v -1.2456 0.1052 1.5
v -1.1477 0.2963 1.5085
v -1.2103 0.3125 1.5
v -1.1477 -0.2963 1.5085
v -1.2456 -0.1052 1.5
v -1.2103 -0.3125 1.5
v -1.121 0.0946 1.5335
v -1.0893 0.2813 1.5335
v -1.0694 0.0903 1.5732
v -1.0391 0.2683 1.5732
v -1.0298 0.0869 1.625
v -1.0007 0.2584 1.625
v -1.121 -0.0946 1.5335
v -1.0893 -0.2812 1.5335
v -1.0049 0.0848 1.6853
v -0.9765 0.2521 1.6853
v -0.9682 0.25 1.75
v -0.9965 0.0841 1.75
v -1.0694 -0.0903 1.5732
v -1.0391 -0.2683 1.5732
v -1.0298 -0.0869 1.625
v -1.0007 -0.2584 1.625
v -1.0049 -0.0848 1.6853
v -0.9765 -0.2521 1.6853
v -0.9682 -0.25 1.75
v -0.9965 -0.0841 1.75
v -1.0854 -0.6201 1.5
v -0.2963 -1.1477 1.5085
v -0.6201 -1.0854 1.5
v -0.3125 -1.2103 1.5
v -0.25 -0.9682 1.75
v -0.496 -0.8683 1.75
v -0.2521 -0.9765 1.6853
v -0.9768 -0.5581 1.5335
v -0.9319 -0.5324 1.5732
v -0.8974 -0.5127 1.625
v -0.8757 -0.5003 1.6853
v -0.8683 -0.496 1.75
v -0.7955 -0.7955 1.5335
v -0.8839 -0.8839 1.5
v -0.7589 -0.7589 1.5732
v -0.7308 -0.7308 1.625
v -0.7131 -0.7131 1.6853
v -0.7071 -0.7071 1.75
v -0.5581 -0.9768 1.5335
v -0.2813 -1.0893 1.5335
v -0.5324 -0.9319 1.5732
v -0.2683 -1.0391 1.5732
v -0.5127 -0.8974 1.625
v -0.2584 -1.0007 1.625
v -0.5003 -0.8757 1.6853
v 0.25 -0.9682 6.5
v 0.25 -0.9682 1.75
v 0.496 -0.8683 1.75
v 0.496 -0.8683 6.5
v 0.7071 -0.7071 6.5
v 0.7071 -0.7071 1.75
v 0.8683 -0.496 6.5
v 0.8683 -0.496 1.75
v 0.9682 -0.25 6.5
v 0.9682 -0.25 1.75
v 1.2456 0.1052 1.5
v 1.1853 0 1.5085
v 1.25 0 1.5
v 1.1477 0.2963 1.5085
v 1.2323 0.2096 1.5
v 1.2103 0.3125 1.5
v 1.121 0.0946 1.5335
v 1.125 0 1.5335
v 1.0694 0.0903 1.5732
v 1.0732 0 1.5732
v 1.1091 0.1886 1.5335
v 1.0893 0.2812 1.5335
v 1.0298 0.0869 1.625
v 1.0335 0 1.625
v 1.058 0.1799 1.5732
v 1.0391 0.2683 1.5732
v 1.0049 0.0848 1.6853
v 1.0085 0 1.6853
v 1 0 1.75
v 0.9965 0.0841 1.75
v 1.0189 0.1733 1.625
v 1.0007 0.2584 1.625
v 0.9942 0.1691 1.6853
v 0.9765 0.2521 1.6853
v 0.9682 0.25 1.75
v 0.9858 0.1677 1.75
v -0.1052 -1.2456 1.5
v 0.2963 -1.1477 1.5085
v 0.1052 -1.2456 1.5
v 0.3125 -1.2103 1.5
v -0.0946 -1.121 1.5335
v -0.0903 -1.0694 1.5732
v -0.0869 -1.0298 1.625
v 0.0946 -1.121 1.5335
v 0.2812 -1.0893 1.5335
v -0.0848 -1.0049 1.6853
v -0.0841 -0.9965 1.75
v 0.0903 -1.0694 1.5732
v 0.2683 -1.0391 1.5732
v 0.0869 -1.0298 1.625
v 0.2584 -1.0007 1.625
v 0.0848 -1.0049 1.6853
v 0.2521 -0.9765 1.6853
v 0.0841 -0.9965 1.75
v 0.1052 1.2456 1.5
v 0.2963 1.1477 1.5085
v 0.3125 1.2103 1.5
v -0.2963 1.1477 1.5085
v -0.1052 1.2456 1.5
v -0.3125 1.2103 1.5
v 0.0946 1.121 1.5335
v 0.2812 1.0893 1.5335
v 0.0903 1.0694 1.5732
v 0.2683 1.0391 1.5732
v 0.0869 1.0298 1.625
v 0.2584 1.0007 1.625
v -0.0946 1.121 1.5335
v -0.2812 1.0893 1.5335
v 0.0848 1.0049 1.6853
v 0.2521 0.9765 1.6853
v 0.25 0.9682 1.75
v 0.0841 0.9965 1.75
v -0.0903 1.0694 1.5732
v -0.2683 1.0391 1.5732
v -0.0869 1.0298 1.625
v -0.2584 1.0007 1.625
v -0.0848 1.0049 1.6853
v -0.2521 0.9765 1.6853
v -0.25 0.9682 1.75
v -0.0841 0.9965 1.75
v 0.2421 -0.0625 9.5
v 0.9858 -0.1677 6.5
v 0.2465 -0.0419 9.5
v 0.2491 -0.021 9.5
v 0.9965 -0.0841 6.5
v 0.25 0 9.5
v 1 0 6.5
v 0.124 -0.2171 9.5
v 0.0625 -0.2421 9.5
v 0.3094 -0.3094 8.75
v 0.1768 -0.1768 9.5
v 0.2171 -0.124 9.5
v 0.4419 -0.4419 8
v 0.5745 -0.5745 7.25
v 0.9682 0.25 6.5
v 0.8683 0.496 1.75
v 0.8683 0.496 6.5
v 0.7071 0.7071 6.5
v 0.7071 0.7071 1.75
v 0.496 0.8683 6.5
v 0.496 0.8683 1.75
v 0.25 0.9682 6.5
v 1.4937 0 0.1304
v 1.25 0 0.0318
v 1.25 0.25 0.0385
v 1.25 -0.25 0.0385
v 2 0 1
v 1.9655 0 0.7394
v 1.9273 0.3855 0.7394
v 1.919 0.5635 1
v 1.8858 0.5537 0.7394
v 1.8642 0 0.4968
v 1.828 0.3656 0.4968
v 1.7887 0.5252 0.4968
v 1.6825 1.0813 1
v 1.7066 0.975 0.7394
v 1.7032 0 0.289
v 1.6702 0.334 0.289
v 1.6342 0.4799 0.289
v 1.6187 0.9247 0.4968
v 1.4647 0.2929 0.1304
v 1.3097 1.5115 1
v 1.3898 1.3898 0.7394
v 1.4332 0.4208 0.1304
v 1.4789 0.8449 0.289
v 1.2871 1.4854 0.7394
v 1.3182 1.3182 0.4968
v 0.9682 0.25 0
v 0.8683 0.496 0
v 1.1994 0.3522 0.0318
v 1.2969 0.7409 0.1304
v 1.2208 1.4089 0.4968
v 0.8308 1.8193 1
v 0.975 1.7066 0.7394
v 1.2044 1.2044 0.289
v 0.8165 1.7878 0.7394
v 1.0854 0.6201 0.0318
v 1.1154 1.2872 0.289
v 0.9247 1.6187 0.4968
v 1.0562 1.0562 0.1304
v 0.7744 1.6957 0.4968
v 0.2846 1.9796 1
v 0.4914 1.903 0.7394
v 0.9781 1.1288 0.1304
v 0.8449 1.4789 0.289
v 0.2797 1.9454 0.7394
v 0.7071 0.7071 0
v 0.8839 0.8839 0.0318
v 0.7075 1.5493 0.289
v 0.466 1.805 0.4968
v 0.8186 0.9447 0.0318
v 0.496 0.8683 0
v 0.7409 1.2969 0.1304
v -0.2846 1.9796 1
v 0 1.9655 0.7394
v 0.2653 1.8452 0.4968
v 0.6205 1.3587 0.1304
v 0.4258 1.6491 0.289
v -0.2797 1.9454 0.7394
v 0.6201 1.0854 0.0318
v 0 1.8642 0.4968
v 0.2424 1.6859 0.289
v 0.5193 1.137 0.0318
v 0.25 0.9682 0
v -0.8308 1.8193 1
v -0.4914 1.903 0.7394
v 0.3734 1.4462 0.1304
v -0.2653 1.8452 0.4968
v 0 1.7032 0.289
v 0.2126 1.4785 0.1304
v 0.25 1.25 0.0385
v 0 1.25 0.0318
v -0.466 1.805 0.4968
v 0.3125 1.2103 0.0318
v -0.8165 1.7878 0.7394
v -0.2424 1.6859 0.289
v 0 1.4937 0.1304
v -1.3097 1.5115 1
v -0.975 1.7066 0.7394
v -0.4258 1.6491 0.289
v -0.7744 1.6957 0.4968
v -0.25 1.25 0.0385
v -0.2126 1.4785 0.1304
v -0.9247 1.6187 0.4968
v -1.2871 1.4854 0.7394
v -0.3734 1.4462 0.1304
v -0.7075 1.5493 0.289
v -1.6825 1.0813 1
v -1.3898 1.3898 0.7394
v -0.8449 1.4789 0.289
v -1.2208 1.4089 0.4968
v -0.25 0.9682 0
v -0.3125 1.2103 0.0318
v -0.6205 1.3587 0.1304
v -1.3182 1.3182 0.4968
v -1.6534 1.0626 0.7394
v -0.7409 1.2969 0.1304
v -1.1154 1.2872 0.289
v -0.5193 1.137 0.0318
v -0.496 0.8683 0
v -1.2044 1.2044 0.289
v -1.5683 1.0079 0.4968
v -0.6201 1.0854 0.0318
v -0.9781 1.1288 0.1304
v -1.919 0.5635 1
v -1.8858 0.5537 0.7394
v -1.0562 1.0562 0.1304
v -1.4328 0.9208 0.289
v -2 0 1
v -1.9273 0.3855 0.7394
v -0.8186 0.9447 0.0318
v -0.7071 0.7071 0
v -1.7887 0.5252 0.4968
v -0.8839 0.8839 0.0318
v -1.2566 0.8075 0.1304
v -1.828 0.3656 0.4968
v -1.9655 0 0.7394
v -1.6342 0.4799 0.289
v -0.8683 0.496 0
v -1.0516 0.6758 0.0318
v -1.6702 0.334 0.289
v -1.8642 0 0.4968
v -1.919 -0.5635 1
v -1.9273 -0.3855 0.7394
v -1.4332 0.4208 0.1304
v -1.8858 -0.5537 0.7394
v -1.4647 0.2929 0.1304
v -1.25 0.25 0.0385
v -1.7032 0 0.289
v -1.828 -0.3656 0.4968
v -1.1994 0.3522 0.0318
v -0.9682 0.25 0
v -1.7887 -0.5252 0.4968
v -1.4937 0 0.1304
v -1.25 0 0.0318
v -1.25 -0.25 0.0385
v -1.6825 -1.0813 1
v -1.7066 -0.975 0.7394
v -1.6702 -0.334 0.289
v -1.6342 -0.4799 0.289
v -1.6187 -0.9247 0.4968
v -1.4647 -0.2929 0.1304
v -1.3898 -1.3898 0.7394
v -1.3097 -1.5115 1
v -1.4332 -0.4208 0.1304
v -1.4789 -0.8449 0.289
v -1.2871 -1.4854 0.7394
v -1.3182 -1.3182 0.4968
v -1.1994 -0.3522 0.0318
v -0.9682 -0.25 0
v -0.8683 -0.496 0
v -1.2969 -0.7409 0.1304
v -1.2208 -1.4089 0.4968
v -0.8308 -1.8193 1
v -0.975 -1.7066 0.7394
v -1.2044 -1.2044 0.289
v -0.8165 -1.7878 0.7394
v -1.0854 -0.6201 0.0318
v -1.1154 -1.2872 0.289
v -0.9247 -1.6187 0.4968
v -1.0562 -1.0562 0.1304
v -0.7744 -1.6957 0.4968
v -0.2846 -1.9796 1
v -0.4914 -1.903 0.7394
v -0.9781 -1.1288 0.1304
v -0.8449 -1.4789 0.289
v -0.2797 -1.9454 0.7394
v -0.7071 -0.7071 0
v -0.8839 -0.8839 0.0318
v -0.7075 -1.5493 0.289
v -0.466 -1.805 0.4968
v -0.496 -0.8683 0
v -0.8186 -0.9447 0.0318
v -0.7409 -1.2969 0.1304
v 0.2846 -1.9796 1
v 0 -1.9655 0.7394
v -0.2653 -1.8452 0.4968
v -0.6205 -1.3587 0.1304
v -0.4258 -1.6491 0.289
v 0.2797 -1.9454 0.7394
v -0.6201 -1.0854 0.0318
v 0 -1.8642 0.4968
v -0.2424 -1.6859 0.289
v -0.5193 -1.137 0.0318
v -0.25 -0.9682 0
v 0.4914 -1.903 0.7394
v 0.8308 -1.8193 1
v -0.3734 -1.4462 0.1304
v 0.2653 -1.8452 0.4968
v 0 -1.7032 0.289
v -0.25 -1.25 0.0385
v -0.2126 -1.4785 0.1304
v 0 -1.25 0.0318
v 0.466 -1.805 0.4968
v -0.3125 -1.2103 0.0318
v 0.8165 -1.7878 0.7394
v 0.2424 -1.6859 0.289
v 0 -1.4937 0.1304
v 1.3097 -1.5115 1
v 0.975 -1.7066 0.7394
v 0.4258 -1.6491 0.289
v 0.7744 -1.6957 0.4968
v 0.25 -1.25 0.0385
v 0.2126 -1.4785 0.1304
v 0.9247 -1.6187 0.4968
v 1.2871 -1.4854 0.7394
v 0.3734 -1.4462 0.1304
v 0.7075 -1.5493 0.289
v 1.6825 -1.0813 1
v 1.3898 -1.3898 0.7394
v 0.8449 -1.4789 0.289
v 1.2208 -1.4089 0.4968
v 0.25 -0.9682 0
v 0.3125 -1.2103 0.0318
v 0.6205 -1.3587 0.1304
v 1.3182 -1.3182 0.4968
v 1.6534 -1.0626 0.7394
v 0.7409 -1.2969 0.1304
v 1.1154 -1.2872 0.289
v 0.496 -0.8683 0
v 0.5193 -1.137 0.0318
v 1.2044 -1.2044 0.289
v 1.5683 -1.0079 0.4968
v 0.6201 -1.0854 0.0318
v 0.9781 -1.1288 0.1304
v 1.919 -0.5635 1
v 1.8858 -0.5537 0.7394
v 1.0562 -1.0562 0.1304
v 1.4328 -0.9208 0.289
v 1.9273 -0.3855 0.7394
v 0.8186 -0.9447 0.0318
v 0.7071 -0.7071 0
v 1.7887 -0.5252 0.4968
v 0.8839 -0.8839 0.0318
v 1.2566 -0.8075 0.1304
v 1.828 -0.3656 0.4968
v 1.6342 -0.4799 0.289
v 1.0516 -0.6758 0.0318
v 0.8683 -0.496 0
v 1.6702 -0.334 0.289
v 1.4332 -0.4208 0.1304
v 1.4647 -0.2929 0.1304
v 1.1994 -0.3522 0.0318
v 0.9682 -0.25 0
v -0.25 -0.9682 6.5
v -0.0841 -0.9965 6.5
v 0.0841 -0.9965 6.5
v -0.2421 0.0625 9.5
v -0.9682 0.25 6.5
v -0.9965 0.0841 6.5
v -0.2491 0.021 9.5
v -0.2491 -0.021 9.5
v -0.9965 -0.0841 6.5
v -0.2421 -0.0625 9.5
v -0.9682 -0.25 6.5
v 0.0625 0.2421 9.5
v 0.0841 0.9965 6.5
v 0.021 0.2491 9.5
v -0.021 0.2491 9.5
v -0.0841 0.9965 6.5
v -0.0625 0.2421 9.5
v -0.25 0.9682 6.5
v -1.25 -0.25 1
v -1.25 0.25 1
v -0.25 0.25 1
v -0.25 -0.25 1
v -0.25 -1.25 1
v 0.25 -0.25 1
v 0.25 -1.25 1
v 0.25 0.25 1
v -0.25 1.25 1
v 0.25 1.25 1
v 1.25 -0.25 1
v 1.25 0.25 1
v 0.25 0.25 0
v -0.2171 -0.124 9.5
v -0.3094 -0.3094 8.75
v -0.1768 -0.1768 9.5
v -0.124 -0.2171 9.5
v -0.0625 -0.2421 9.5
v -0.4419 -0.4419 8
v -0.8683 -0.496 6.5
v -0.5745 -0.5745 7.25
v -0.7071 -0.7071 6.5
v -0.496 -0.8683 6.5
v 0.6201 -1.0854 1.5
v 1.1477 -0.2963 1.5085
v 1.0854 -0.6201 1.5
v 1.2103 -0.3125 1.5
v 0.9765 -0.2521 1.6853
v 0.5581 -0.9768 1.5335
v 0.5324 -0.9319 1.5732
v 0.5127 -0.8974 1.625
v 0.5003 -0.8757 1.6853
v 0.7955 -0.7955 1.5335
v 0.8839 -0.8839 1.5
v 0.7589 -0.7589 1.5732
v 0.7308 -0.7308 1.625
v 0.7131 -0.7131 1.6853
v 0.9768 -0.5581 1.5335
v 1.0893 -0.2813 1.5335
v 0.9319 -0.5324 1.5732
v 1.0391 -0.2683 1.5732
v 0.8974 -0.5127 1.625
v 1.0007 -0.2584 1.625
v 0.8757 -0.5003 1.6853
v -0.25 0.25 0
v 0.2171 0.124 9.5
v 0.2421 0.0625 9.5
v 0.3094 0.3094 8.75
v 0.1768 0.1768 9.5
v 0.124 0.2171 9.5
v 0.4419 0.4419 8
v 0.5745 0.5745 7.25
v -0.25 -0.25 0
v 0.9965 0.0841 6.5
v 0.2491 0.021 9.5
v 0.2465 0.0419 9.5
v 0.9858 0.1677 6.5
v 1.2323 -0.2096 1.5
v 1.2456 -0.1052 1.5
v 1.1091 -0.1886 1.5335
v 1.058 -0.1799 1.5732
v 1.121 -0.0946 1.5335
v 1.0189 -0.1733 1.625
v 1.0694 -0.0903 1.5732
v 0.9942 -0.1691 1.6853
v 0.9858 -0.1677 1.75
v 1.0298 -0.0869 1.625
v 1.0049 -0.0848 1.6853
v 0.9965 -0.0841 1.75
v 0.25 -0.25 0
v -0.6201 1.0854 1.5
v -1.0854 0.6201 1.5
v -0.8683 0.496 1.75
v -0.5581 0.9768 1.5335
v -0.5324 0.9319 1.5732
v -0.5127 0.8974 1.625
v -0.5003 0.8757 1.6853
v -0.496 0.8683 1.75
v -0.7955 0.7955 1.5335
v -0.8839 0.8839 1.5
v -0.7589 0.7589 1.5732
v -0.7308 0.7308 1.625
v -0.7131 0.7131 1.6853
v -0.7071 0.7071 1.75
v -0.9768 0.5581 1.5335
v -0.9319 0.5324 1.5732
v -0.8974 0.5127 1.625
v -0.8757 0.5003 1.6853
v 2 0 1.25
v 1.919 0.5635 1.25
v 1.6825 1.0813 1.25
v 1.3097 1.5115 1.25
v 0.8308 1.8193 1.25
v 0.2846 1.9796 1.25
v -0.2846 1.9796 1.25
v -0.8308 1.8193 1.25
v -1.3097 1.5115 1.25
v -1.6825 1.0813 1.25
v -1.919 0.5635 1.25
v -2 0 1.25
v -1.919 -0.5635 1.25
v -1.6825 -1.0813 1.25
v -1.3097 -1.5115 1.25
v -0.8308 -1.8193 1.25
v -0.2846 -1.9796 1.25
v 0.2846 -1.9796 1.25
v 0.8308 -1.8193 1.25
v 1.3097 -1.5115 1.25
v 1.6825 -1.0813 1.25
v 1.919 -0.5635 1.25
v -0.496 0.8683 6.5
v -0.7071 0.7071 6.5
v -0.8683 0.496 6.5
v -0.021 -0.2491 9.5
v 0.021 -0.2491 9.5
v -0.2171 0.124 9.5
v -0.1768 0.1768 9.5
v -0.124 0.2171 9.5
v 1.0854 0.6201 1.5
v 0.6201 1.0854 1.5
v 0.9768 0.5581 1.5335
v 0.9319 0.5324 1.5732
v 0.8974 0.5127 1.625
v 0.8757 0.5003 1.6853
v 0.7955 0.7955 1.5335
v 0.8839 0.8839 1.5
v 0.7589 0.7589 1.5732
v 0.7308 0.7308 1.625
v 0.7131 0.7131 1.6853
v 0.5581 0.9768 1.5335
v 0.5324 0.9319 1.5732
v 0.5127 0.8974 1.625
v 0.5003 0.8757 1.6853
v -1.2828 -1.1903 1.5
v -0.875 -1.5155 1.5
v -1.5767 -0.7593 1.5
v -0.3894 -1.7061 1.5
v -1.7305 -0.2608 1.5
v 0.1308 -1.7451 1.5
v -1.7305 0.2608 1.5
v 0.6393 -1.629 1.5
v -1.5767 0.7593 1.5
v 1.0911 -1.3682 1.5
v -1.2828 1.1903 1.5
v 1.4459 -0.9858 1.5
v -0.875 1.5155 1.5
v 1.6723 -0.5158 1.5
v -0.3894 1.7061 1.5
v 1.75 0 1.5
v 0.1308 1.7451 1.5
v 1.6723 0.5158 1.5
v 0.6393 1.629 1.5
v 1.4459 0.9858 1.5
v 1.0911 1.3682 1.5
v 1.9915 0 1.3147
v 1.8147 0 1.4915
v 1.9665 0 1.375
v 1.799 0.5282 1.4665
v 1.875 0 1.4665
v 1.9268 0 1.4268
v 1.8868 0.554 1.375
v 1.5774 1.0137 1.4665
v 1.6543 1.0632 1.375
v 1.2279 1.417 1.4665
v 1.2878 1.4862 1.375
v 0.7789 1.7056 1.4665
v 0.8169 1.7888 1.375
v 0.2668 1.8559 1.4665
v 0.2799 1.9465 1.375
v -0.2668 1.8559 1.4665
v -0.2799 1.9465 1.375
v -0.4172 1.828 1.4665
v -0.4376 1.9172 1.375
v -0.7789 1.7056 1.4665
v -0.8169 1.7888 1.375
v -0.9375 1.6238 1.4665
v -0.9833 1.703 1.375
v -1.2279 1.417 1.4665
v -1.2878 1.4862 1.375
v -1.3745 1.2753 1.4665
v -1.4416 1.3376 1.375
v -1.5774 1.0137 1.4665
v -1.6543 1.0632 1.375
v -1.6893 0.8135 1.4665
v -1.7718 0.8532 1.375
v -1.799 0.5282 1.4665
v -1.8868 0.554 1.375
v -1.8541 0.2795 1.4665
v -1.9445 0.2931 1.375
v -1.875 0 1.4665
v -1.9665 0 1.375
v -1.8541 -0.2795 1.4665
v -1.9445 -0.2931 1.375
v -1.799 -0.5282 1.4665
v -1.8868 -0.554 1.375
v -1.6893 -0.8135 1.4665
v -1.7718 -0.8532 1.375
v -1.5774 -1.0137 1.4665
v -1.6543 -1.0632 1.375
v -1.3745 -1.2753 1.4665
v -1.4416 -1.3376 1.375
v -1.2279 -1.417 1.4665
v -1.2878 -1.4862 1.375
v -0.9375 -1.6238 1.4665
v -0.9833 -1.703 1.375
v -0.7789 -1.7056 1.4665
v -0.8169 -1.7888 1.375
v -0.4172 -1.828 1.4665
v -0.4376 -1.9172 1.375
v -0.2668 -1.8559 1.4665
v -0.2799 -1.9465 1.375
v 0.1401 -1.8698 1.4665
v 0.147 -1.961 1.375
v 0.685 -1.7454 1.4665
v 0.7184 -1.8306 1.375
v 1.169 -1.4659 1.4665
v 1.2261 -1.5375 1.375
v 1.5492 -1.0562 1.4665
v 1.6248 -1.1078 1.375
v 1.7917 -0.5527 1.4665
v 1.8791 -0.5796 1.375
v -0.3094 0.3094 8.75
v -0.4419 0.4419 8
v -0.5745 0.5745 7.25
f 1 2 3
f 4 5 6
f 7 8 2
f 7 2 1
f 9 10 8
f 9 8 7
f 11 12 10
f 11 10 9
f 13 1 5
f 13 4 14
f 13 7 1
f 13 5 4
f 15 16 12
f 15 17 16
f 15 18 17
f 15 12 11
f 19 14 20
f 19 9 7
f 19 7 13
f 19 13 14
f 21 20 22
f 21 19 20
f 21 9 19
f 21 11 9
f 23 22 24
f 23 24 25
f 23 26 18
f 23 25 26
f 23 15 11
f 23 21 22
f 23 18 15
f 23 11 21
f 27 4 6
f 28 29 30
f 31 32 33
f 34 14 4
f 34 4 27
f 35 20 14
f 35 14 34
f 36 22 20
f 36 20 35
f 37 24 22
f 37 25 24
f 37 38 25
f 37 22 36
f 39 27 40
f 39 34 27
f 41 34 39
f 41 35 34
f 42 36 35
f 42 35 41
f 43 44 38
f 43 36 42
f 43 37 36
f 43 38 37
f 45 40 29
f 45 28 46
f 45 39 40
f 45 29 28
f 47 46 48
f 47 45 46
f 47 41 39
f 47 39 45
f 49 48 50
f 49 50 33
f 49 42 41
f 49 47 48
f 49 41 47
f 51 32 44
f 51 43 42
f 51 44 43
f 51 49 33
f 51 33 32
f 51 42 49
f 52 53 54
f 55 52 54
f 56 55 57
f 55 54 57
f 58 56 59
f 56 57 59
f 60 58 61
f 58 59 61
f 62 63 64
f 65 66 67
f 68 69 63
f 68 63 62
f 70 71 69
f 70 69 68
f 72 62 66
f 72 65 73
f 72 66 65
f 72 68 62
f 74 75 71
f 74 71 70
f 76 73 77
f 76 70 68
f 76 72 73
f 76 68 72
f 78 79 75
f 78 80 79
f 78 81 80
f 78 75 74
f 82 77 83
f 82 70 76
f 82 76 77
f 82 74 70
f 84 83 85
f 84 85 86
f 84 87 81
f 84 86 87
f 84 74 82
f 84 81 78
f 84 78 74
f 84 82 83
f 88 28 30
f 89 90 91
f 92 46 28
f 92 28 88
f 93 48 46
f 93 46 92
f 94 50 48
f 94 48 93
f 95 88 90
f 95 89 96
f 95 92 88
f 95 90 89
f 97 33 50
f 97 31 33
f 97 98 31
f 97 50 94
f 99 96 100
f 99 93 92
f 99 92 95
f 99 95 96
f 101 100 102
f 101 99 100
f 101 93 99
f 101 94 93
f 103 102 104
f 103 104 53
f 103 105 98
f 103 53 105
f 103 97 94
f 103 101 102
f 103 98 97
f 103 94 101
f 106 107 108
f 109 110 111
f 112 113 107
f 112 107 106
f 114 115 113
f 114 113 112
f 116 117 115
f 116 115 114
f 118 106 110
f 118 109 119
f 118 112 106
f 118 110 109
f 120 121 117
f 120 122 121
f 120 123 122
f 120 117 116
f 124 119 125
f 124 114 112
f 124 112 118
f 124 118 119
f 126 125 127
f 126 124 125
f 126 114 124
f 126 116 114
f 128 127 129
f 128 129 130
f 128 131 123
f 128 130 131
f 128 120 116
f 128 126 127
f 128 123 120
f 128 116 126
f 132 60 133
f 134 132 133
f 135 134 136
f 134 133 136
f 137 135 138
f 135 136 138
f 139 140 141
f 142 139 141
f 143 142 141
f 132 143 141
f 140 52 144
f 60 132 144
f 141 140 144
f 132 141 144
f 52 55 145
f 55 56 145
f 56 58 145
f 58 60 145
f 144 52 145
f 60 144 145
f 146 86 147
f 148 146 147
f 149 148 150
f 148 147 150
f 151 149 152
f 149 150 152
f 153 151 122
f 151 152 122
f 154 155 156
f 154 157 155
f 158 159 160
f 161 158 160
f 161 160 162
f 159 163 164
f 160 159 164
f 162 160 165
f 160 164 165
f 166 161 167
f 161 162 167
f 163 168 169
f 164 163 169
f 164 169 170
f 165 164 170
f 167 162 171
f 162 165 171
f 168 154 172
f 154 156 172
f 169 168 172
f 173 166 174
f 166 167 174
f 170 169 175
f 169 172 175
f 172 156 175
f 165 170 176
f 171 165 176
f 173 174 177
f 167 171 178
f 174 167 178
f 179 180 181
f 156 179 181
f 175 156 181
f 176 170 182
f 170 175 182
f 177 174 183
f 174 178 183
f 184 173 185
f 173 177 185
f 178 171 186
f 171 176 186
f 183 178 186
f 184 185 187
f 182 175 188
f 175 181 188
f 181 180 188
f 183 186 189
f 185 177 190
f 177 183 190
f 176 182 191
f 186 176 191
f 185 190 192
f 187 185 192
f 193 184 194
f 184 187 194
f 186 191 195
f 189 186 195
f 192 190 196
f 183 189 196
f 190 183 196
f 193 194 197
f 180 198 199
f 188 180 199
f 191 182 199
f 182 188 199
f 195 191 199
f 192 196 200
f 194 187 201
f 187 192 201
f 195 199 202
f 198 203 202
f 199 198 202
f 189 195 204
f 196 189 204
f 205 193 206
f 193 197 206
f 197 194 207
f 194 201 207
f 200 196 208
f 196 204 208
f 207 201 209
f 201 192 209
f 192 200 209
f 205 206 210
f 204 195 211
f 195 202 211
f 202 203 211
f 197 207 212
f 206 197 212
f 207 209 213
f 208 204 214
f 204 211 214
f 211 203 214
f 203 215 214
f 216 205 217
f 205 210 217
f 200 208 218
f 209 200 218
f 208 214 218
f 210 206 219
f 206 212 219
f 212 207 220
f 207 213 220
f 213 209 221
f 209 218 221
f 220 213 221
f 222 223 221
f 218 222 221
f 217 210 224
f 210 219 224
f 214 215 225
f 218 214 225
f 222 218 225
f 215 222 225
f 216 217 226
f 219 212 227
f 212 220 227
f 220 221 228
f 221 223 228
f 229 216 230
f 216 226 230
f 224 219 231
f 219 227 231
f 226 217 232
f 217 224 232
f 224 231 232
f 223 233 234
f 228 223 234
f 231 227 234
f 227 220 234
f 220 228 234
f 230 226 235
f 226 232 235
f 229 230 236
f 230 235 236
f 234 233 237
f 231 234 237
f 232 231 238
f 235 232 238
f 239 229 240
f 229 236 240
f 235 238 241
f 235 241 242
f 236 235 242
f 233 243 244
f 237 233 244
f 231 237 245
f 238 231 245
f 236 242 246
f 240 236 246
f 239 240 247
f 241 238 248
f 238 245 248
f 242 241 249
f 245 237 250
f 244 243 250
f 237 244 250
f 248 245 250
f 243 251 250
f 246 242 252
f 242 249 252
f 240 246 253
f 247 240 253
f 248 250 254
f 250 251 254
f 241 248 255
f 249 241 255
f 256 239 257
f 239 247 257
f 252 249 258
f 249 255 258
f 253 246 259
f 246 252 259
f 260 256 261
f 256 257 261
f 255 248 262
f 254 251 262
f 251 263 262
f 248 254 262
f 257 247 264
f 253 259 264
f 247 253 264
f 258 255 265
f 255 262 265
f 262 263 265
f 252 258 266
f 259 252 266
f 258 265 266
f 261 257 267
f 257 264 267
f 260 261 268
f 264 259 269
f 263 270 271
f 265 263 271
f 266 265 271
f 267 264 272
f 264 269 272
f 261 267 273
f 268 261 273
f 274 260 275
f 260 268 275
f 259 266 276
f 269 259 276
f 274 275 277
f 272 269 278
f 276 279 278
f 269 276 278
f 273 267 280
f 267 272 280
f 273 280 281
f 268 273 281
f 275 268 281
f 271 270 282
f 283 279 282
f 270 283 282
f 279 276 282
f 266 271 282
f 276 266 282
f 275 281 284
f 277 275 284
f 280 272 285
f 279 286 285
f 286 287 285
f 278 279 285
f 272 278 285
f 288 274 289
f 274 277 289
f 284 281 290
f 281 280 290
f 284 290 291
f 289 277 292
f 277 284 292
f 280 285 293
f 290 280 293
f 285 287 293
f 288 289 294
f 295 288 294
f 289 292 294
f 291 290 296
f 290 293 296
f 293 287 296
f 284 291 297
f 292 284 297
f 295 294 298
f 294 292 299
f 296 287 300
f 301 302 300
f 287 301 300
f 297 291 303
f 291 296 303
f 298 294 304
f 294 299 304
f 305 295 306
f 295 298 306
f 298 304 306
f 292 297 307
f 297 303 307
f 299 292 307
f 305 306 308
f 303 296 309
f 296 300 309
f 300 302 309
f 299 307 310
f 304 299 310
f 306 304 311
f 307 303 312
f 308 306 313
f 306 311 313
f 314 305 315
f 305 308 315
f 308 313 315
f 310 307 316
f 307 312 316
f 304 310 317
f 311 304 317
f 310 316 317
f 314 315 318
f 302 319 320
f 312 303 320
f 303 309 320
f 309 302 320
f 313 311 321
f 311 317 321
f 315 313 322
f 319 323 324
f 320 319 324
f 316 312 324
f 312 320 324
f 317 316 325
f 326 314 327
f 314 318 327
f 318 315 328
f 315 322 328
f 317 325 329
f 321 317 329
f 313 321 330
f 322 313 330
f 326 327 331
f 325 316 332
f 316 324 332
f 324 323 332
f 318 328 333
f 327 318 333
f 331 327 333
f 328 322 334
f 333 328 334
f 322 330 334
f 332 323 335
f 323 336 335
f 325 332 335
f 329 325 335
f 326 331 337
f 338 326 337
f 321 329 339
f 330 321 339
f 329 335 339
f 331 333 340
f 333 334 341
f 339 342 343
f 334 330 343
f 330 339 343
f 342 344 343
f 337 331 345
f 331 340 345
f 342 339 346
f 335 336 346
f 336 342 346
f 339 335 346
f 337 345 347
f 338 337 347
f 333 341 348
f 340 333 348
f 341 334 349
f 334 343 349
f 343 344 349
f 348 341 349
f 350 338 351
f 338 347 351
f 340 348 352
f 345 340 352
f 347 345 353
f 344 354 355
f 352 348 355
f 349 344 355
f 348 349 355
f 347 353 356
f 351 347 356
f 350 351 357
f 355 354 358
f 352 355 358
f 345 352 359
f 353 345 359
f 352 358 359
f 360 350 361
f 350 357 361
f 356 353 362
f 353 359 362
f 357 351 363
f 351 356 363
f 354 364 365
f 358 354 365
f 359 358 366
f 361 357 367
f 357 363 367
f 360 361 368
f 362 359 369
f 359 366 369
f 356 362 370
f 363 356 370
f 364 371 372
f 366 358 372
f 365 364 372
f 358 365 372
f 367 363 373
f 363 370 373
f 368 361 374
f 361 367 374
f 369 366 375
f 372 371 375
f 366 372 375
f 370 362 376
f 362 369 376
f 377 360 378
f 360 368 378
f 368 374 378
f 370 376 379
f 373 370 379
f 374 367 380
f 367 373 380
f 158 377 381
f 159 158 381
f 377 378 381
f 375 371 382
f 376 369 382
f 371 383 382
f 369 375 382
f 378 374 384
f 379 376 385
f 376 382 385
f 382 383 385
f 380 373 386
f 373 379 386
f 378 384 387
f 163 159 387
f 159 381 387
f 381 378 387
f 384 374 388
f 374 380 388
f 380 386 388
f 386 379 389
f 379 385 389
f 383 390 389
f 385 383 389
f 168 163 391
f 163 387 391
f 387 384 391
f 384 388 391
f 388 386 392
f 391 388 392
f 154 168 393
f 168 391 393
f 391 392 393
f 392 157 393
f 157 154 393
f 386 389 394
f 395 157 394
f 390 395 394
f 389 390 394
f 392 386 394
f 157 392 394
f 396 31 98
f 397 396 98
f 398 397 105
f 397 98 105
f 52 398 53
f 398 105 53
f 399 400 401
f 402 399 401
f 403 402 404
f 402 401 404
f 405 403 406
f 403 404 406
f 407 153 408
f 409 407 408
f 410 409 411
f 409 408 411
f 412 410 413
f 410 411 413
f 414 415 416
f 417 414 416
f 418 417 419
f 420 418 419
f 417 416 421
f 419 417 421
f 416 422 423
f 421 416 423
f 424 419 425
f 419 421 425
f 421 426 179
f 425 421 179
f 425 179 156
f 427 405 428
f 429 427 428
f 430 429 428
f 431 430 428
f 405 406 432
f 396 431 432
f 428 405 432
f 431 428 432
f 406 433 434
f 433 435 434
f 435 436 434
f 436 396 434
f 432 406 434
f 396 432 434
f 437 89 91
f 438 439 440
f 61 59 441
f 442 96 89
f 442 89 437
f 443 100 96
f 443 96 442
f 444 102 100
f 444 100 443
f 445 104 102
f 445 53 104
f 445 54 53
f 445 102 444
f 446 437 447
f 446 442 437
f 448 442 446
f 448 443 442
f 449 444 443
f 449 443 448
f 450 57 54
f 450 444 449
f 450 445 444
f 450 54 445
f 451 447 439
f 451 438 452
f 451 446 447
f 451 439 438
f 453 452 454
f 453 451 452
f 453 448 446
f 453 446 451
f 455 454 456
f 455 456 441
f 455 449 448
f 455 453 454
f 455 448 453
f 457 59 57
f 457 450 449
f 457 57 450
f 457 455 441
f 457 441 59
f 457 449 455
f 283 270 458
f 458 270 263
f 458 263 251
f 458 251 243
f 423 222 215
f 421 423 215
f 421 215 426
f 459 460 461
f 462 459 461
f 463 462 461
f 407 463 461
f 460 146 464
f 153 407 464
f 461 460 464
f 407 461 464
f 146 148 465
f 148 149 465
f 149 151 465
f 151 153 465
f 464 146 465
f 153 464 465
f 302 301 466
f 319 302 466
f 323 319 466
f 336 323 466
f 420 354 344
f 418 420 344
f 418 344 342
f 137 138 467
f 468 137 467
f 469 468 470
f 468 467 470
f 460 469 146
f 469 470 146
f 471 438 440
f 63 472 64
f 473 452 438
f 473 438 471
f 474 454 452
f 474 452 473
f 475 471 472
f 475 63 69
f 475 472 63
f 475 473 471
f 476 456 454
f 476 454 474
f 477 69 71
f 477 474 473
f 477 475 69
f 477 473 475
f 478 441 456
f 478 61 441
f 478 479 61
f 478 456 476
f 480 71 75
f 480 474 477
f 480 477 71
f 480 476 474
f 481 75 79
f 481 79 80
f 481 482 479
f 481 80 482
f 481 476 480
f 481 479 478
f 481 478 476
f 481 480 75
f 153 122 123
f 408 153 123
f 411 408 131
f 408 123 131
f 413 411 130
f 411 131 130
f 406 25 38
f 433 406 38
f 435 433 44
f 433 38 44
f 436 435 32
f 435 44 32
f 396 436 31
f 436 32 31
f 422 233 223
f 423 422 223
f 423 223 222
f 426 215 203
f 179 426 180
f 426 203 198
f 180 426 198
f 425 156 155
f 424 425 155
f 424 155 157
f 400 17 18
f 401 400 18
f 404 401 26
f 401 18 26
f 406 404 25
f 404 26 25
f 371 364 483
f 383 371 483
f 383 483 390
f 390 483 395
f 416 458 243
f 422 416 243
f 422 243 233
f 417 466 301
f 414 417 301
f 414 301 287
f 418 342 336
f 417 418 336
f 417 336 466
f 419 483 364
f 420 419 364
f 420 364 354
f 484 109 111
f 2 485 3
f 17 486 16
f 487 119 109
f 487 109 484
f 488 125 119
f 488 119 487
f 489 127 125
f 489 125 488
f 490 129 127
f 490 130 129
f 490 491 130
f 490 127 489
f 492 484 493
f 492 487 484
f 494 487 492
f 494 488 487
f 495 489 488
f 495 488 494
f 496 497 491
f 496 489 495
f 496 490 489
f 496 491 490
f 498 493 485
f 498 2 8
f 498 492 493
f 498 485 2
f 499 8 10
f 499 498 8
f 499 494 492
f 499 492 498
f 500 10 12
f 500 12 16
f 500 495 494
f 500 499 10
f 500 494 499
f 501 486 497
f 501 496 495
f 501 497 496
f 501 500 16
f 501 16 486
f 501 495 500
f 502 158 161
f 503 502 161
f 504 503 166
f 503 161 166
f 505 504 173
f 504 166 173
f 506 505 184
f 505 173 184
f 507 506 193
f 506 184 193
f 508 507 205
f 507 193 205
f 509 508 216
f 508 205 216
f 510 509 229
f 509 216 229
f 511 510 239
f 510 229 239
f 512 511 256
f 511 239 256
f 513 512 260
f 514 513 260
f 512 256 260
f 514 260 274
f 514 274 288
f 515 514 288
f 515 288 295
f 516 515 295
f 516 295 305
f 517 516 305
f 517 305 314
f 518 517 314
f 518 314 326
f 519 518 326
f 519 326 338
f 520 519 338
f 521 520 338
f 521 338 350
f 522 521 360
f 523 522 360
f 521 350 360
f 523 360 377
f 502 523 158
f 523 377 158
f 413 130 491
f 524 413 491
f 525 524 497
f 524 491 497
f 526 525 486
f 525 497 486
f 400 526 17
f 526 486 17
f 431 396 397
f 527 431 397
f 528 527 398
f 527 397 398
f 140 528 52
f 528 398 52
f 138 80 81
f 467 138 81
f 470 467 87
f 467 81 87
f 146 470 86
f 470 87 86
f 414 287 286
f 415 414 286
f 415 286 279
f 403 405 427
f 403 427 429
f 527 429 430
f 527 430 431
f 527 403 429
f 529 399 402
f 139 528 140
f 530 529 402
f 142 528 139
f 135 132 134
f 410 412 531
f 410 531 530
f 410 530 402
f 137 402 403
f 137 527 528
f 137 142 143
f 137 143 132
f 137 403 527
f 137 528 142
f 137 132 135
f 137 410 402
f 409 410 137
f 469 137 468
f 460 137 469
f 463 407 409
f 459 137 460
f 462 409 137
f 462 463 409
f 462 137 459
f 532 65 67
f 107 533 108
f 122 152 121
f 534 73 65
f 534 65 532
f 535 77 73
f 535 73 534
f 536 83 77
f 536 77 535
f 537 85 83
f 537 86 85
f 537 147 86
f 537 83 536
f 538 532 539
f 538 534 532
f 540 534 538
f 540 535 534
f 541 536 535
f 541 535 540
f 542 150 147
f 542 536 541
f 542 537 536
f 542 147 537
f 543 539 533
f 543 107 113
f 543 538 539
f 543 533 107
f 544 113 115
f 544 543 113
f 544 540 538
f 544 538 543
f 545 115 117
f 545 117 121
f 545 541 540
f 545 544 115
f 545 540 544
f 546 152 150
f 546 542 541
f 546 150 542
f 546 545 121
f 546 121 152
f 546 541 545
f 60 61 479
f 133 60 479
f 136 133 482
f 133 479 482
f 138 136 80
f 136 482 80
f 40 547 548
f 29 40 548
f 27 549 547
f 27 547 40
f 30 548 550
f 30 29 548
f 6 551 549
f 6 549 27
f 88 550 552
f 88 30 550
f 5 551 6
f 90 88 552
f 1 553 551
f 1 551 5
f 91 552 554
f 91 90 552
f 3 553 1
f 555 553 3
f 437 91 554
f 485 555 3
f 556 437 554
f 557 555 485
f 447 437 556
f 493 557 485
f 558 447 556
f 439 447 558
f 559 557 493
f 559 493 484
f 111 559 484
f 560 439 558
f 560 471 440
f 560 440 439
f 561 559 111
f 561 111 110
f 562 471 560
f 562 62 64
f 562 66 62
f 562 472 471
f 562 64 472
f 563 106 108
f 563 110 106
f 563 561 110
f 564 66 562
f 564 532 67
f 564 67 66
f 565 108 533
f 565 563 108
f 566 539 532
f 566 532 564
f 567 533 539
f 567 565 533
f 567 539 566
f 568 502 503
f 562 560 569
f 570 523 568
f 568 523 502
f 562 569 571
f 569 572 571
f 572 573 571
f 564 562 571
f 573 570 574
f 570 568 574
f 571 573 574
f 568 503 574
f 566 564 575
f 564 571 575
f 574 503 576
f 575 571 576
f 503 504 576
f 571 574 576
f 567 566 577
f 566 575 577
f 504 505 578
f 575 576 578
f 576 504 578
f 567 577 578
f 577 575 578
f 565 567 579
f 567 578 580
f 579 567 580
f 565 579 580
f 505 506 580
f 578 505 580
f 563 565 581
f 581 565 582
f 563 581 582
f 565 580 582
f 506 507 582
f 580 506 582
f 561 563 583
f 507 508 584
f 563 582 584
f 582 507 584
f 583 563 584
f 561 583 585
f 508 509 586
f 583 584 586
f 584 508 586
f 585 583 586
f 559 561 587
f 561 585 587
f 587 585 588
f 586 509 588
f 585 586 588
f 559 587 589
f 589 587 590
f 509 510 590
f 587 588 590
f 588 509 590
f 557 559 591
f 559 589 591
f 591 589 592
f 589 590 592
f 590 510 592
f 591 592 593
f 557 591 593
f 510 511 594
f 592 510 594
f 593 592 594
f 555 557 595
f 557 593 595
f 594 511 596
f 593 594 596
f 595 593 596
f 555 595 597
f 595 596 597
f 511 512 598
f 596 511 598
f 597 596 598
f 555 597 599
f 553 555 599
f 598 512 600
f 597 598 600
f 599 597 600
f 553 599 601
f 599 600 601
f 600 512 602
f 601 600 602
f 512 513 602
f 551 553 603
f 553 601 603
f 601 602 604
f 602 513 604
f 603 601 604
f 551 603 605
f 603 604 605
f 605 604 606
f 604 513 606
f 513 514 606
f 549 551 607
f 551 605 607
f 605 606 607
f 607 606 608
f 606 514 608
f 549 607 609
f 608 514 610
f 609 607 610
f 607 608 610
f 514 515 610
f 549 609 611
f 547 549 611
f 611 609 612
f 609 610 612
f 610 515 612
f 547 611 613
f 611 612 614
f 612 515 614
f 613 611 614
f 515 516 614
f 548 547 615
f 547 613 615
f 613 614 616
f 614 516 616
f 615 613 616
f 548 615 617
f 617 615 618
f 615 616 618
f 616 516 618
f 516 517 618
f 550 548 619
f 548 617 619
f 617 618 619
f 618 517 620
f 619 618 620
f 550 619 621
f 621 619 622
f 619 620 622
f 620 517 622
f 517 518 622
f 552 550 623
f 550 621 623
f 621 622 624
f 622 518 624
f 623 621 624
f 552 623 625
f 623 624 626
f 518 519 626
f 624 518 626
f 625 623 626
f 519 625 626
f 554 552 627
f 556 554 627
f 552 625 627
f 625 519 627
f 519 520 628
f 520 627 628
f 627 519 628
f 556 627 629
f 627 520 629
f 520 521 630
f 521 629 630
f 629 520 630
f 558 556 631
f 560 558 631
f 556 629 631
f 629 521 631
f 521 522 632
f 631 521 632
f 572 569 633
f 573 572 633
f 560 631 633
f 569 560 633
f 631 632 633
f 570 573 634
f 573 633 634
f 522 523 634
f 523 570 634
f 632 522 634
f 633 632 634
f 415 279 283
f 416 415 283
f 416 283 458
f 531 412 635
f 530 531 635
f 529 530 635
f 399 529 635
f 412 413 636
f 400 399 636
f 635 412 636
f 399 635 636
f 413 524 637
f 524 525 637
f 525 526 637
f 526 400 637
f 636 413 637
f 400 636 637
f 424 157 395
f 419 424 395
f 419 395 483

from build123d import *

# Parameters (mm, degrees)
F0_R     = 2
F1_DEPTH = 1
F2_START = 1
F0_W     = 0.5
F0_H     = 0.5
F2_DEPTH = 0.5
F3_START = 1.5
F3_DEPTH = 8
F4_SIZE2 = 3
F4_SIZE  = 0.75
F6_R     = 0.25


# Not quite as in the source:
# - a fillet or chamfer that OpenCascade refuses, or shapes differently, is made with other operations: its cross-section is extruded or revolved along the edge and cut away or added


with BuildPart() as f1:
    # F0 (on Top) → F1 (new body)
    with BuildSketch(Plane.XY):
        Circle(F0_R)
        with BuildLine():
            ThreePointArc((0.25, 0.9682458366), (0.7071067812, 0.7071067812), (0.9682458366, 0.25))
            Line((0.9682458366, 0.25), (1.25, 0.25))
            Line((1.25, 0.25), (1.25, -0.25))
            Line((1.25, -0.25), (0.9682458366, -0.25))
            ThreePointArc((0.9682458366, -0.25), (0.7071067812, -0.7071067812), (0.25, -0.9682458366))
            Line((0.25, -0.9682458366), (0.25, -1.25))
            Line((0.25, -1.25), (-0.25, -1.25))
            Line((-0.25, -1.25), (-0.25, -0.9682458366))
            ThreePointArc((-0.25, -0.9682458366), (-0.7071067812, -0.7071067812), (-0.9682458366, -0.25))
            Line((-0.9682458366, -0.25), (-1.25, -0.25))
            Line((-1.25, -0.25), (-1.25, 0.25))
            Line((-1.25, 0.25), (-0.9682458366, 0.25))
            ThreePointArc((-0.9682458366, 0.25), (-0.7071067812, 0.7071067812), (-0.25, 0.9682458366))
            Line((-0.25, 0.9682458366), (-0.25, 1.25))
            Line((-0.25, 1.25), (0.25, 1.25))
            Line((0.25, 1.25), (0.25, 0.9682458366))
        make_face(mode=Mode.SUBTRACT)
        with BuildLine():
            Line((-0.25, 0.25), (-0.25, 0.9682458366))
            ThreePointArc((-0.25, 0.9682458366), (-0.7071067812, 0.7071067812), (-0.9682458366, 0.25))
            Line((-0.9682458366, 0.25), (-0.25, 0.25))
        make_face()
        with BuildLine():
            ThreePointArc((-0.9682458366, -0.25), (-0.7071067812, -0.7071067812), (-0.25, -0.9682458366))
            Line((-0.25, -0.9682458366), (-0.25, -0.25))
            Line((-0.25, -0.25), (-0.9682458366, -0.25))
        make_face()
        with BuildLine():
            ThreePointArc((0.25, -0.9682458366), (0.7071067812, -0.7071067812), (0.9682458366, -0.25))
            Line((0.9682458366, -0.25), (0.25, -0.25))
            Line((0.25, -0.25), (0.25, -0.9682458366))
        make_face()
        with BuildLine():
            Line((0.25, 0.25), (0.9682458366, 0.25))
            ThreePointArc((0.9682458366, 0.25), (0.7071067812, 0.7071067812), (0.25, 0.9682458366))
            Line((0.25, 0.9682458366), (0.25, 0.25))
        make_face()
    extrude(amount=F1_DEPTH)

    # F0 (on Top) → F2 (join)
    with BuildSketch(Plane.XY.offset(F2_START)):
        Circle(F0_R)
        with BuildLine():
            ThreePointArc((0.25, 0.9682458366), (0.7071067812, 0.7071067812), (0.9682458366, 0.25))
            Line((0.9682458366, 0.25), (1.25, 0.25))
            Line((1.25, 0.25), (1.25, -0.25))
            Line((1.25, -0.25), (0.9682458366, -0.25))
            ThreePointArc((0.9682458366, -0.25), (0.7071067812, -0.7071067812), (0.25, -0.9682458366))
            Line((0.25, -0.9682458366), (0.25, -1.25))
            Line((0.25, -1.25), (-0.25, -1.25))
            Line((-0.25, -1.25), (-0.25, -0.9682458366))
            ThreePointArc((-0.25, -0.9682458366), (-0.7071067812, -0.7071067812), (-0.9682458366, -0.25))
            Line((-0.9682458366, -0.25), (-1.25, -0.25))
            Line((-1.25, -0.25), (-1.25, 0.25))
            Line((-1.25, 0.25), (-0.9682458366, 0.25))
            ThreePointArc((-0.9682458366, 0.25), (-0.7071067812, 0.7071067812), (-0.25, 0.9682458366))
            Line((-0.25, 0.9682458366), (-0.25, 1.25))
            Line((-0.25, 1.25), (0.25, 1.25))
            Line((0.25, 1.25), (0.25, 0.9682458366))
        make_face(mode=Mode.SUBTRACT)
        with BuildLine():
            Line((0.25, 0.25), (0.25, 0.9682458366))
            ThreePointArc((0.25, 0.9682458366), (0, 1), (-0.25, 0.9682458366))
            Line((-0.25, 0.9682458366), (-0.25, 0.25))
            Line((-0.25, 0.25), (0.25, 0.25))
        make_face()
        with BuildLine():
            ThreePointArc((-0.25, -0.9682458366), (0, -1), (0.25, -0.9682458366))
            Line((0.25, -0.9682458366), (0.25, -0.25))
            Line((0.25, -0.25), (-0.25, -0.25))
            Line((-0.25, -0.25), (-0.25, -0.9682458366))
        make_face()
        with BuildLine():
            ThreePointArc((0.9682458366, -0.25), (0.9920296963, -0.1260042925), (1, 0))
            ThreePointArc((1, 0), (0.9920296963, 0.1260042925), (0.9682458366, 0.25))
            Line((0.9682458366, 0.25), (0.25, 0.25))
            Line((0.25, 0.25), (0.25, -0.25))
            Line((0.25, -0.25), (0.9682458366, -0.25))
        make_face()
        with BuildLine():
            Line((-0.25, -0.25), (-0.25, 0.25))
            Line((-0.25, 0.25), (-0.9682458366, 0.25))
            ThreePointArc((-0.9682458366, 0.25), (-1, 0), (-0.9682458366, -0.25))
            Line((-0.9682458366, -0.25), (-0.25, -0.25))
        make_face()
        with BuildLine():
            ThreePointArc((-0.9682458366, -0.25), (-0.7071067812, -0.7071067812), (-0.25, -0.9682458366))
            Line((-0.25, -0.9682458366), (-0.25, -0.25))
            Line((-0.25, -0.25), (-0.9682458366, -0.25))
        make_face()
        with BuildLine():
            ThreePointArc((0.25, -0.9682458366), (0.7071067812, -0.7071067812), (0.9682458366, -0.25))
            Line((0.9682458366, -0.25), (0.25, -0.25))
            Line((0.25, -0.25), (0.25, -0.9682458366))
        make_face()
        with BuildLine():
            Line((0.25, 0.25), (0.9682458366, 0.25))
            ThreePointArc((0.9682458366, 0.25), (0.7071067812, 0.7071067812), (0.25, 0.9682458366))
            Line((0.25, 0.9682458366), (0.25, 0.25))
        make_face()
        with BuildLine():
            Line((-0.25, 0.25), (-0.25, 0.9682458366))
            ThreePointArc((-0.25, 0.9682458366), (-0.7071067812, 0.7071067812), (-0.9682458366, 0.25))
            Line((-0.9682458366, 0.25), (-0.25, 0.25))
        make_face()
        Rectangle(F0_W, F0_H)
        with BuildLine():
            ThreePointArc((-0.9682458366, -0.25), (-1, 0), (-0.9682458366, 0.25))
            Line((-0.9682458366, 0.25), (-1.25, 0.25))
            Line((-1.25, 0.25), (-1.25, -0.25))
            Line((-1.25, -0.25), (-0.9682458366, -0.25))
        make_face()
        with BuildLine():
            ThreePointArc((0.9682458366, 0.25), (0.9920296963, 0.1260042925), (1, 0))
            ThreePointArc((1, 0), (0.9920296963, -0.1260042925), (0.9682458366, -0.25))
            Line((0.9682458366, -0.25), (1.25, -0.25))
            Line((1.25, -0.25), (1.25, 0.25))
            Line((1.25, 0.25), (0.9682458366, 0.25))
        make_face()
        with BuildLine():
            ThreePointArc((-0.25, 0.9682458366), (0, 1), (0.25, 0.9682458366))
            Line((0.25, 0.9682458366), (0.25, 1.25))
            Line((0.25, 1.25), (-0.25, 1.25))
            Line((-0.25, 1.25), (-0.25, 0.9682458366))
        make_face()
        with BuildLine():
            Line((0.25, -1.25), (0.25, -0.9682458366))
            ThreePointArc((0.25, -0.9682458366), (0, -1), (-0.25, -0.9682458366))
            Line((-0.25, -0.9682458366), (-0.25, -1.25))
            Line((-0.25, -1.25), (0.25, -1.25))
        make_face()
    extrude(amount=F2_DEPTH)

    # F0 (on Top) → F3 (join)
    with BuildSketch(Plane.XY.offset(F3_START)):
        with BuildLine():
            ThreePointArc((-0.9682458366, -0.25), (-0.7071067812, -0.7071067812), (-0.25, -0.9682458366))
            Line((-0.25, -0.9682458366), (-0.25, -0.25))
            Line((-0.25, -0.25), (-0.9682458366, -0.25))
        make_face()
        with BuildLine():
            Line((-0.25, -0.25), (-0.25, 0.25))
            Line((-0.25, 0.25), (-0.9682458366, 0.25))
            ThreePointArc((-0.9682458366, 0.25), (-1, 0), (-0.9682458366, -0.25))
            Line((-0.9682458366, -0.25), (-0.25, -0.25))
        make_face()
        with BuildLine():
            Line((-0.25, 0.25), (-0.25, 0.9682458366))
            ThreePointArc((-0.25, 0.9682458366), (-0.7071067812, 0.7071067812), (-0.9682458366, 0.25))
            Line((-0.9682458366, 0.25), (-0.25, 0.25))
        make_face()
        with BuildLine():
            Line((0.25, 0.25), (0.25, 0.9682458366))
            ThreePointArc((0.25, 0.9682458366), (0, 1), (-0.25, 0.9682458366))
            Line((-0.25, 0.9682458366), (-0.25, 0.25))
            Line((-0.25, 0.25), (0.25, 0.25))
        make_face()
        with BuildLine():
            Line((0.25, 0.25), (0.9682458366, 0.25))
            ThreePointArc((0.9682458366, 0.25), (0.7071067812, 0.7071067812), (0.25, 0.9682458366))
            Line((0.25, 0.9682458366), (0.25, 0.25))
        make_face()
        with BuildLine():
            ThreePointArc((0.9682458366, -0.25), (0.9920296963, -0.1260042925), (1, 0))
            ThreePointArc((1, 0), (0.9920296963, 0.1260042925), (0.9682458366, 0.25))
            Line((0.9682458366, 0.25), (0.25, 0.25))
            Line((0.25, 0.25), (0.25, -0.25))
            Line((0.25, -0.25), (0.9682458366, -0.25))
        make_face()
        with BuildLine():
            ThreePointArc((-0.25, -0.9682458366), (0, -1), (0.25, -0.9682458366))
            Line((0.25, -0.9682458366), (0.25, -0.25))
            Line((0.25, -0.25), (-0.25, -0.25))
            Line((-0.25, -0.25), (-0.25, -0.9682458366))
        make_face()
        with BuildLine():
            ThreePointArc((0.25, -0.9682458366), (0.7071067812, -0.7071067812), (0.9682458366, -0.25))
            Line((0.9682458366, -0.25), (0.25, -0.25))
            Line((0.25, -0.25), (0.25, -0.9682458366))
        make_face()
        Rectangle(F0_W, F0_H)
    extrude(amount=F3_DEPTH)

    # F4
    f4_edges = [f1.edges().sort_by_distance(p)[0] for p in [
        (-0.25, 0.968246, 9.5),
    ]]
    f4_side = f1.faces().sort_by_distance((0, 0, 9.5))[0]
    chamfer(f4_edges, length=F4_SIZE, length2=F4_SIZE2, reference=f4_side)

    # F5: fillet of radius 1 on 1 edges, made by hand

    # F5_s1 → F5_t2 (revolve, cut)
    with BuildSketch(Plane.XZ):
        with BuildLine():
            ThreePointArc((2, 1), (1.7071067812, 0.2928932188), (1, 0))
            Line((1, 0), (2, 0))
            Line((2, 0), (2, 1))
        make_face()
    revolve(axis=Axis((0, 0, 0), (0, 0, 1)), mode=Mode.SUBTRACT)

    # F6
    f6_edges = [f1.edges().sort_by_distance(p)[0] for p in [
        (-2, 0, 1.5),
        (-0.25, 0.968246, 1.5),
    ]]
    fillet(f6_edges, radius=F6_R)


solid = f1.part
